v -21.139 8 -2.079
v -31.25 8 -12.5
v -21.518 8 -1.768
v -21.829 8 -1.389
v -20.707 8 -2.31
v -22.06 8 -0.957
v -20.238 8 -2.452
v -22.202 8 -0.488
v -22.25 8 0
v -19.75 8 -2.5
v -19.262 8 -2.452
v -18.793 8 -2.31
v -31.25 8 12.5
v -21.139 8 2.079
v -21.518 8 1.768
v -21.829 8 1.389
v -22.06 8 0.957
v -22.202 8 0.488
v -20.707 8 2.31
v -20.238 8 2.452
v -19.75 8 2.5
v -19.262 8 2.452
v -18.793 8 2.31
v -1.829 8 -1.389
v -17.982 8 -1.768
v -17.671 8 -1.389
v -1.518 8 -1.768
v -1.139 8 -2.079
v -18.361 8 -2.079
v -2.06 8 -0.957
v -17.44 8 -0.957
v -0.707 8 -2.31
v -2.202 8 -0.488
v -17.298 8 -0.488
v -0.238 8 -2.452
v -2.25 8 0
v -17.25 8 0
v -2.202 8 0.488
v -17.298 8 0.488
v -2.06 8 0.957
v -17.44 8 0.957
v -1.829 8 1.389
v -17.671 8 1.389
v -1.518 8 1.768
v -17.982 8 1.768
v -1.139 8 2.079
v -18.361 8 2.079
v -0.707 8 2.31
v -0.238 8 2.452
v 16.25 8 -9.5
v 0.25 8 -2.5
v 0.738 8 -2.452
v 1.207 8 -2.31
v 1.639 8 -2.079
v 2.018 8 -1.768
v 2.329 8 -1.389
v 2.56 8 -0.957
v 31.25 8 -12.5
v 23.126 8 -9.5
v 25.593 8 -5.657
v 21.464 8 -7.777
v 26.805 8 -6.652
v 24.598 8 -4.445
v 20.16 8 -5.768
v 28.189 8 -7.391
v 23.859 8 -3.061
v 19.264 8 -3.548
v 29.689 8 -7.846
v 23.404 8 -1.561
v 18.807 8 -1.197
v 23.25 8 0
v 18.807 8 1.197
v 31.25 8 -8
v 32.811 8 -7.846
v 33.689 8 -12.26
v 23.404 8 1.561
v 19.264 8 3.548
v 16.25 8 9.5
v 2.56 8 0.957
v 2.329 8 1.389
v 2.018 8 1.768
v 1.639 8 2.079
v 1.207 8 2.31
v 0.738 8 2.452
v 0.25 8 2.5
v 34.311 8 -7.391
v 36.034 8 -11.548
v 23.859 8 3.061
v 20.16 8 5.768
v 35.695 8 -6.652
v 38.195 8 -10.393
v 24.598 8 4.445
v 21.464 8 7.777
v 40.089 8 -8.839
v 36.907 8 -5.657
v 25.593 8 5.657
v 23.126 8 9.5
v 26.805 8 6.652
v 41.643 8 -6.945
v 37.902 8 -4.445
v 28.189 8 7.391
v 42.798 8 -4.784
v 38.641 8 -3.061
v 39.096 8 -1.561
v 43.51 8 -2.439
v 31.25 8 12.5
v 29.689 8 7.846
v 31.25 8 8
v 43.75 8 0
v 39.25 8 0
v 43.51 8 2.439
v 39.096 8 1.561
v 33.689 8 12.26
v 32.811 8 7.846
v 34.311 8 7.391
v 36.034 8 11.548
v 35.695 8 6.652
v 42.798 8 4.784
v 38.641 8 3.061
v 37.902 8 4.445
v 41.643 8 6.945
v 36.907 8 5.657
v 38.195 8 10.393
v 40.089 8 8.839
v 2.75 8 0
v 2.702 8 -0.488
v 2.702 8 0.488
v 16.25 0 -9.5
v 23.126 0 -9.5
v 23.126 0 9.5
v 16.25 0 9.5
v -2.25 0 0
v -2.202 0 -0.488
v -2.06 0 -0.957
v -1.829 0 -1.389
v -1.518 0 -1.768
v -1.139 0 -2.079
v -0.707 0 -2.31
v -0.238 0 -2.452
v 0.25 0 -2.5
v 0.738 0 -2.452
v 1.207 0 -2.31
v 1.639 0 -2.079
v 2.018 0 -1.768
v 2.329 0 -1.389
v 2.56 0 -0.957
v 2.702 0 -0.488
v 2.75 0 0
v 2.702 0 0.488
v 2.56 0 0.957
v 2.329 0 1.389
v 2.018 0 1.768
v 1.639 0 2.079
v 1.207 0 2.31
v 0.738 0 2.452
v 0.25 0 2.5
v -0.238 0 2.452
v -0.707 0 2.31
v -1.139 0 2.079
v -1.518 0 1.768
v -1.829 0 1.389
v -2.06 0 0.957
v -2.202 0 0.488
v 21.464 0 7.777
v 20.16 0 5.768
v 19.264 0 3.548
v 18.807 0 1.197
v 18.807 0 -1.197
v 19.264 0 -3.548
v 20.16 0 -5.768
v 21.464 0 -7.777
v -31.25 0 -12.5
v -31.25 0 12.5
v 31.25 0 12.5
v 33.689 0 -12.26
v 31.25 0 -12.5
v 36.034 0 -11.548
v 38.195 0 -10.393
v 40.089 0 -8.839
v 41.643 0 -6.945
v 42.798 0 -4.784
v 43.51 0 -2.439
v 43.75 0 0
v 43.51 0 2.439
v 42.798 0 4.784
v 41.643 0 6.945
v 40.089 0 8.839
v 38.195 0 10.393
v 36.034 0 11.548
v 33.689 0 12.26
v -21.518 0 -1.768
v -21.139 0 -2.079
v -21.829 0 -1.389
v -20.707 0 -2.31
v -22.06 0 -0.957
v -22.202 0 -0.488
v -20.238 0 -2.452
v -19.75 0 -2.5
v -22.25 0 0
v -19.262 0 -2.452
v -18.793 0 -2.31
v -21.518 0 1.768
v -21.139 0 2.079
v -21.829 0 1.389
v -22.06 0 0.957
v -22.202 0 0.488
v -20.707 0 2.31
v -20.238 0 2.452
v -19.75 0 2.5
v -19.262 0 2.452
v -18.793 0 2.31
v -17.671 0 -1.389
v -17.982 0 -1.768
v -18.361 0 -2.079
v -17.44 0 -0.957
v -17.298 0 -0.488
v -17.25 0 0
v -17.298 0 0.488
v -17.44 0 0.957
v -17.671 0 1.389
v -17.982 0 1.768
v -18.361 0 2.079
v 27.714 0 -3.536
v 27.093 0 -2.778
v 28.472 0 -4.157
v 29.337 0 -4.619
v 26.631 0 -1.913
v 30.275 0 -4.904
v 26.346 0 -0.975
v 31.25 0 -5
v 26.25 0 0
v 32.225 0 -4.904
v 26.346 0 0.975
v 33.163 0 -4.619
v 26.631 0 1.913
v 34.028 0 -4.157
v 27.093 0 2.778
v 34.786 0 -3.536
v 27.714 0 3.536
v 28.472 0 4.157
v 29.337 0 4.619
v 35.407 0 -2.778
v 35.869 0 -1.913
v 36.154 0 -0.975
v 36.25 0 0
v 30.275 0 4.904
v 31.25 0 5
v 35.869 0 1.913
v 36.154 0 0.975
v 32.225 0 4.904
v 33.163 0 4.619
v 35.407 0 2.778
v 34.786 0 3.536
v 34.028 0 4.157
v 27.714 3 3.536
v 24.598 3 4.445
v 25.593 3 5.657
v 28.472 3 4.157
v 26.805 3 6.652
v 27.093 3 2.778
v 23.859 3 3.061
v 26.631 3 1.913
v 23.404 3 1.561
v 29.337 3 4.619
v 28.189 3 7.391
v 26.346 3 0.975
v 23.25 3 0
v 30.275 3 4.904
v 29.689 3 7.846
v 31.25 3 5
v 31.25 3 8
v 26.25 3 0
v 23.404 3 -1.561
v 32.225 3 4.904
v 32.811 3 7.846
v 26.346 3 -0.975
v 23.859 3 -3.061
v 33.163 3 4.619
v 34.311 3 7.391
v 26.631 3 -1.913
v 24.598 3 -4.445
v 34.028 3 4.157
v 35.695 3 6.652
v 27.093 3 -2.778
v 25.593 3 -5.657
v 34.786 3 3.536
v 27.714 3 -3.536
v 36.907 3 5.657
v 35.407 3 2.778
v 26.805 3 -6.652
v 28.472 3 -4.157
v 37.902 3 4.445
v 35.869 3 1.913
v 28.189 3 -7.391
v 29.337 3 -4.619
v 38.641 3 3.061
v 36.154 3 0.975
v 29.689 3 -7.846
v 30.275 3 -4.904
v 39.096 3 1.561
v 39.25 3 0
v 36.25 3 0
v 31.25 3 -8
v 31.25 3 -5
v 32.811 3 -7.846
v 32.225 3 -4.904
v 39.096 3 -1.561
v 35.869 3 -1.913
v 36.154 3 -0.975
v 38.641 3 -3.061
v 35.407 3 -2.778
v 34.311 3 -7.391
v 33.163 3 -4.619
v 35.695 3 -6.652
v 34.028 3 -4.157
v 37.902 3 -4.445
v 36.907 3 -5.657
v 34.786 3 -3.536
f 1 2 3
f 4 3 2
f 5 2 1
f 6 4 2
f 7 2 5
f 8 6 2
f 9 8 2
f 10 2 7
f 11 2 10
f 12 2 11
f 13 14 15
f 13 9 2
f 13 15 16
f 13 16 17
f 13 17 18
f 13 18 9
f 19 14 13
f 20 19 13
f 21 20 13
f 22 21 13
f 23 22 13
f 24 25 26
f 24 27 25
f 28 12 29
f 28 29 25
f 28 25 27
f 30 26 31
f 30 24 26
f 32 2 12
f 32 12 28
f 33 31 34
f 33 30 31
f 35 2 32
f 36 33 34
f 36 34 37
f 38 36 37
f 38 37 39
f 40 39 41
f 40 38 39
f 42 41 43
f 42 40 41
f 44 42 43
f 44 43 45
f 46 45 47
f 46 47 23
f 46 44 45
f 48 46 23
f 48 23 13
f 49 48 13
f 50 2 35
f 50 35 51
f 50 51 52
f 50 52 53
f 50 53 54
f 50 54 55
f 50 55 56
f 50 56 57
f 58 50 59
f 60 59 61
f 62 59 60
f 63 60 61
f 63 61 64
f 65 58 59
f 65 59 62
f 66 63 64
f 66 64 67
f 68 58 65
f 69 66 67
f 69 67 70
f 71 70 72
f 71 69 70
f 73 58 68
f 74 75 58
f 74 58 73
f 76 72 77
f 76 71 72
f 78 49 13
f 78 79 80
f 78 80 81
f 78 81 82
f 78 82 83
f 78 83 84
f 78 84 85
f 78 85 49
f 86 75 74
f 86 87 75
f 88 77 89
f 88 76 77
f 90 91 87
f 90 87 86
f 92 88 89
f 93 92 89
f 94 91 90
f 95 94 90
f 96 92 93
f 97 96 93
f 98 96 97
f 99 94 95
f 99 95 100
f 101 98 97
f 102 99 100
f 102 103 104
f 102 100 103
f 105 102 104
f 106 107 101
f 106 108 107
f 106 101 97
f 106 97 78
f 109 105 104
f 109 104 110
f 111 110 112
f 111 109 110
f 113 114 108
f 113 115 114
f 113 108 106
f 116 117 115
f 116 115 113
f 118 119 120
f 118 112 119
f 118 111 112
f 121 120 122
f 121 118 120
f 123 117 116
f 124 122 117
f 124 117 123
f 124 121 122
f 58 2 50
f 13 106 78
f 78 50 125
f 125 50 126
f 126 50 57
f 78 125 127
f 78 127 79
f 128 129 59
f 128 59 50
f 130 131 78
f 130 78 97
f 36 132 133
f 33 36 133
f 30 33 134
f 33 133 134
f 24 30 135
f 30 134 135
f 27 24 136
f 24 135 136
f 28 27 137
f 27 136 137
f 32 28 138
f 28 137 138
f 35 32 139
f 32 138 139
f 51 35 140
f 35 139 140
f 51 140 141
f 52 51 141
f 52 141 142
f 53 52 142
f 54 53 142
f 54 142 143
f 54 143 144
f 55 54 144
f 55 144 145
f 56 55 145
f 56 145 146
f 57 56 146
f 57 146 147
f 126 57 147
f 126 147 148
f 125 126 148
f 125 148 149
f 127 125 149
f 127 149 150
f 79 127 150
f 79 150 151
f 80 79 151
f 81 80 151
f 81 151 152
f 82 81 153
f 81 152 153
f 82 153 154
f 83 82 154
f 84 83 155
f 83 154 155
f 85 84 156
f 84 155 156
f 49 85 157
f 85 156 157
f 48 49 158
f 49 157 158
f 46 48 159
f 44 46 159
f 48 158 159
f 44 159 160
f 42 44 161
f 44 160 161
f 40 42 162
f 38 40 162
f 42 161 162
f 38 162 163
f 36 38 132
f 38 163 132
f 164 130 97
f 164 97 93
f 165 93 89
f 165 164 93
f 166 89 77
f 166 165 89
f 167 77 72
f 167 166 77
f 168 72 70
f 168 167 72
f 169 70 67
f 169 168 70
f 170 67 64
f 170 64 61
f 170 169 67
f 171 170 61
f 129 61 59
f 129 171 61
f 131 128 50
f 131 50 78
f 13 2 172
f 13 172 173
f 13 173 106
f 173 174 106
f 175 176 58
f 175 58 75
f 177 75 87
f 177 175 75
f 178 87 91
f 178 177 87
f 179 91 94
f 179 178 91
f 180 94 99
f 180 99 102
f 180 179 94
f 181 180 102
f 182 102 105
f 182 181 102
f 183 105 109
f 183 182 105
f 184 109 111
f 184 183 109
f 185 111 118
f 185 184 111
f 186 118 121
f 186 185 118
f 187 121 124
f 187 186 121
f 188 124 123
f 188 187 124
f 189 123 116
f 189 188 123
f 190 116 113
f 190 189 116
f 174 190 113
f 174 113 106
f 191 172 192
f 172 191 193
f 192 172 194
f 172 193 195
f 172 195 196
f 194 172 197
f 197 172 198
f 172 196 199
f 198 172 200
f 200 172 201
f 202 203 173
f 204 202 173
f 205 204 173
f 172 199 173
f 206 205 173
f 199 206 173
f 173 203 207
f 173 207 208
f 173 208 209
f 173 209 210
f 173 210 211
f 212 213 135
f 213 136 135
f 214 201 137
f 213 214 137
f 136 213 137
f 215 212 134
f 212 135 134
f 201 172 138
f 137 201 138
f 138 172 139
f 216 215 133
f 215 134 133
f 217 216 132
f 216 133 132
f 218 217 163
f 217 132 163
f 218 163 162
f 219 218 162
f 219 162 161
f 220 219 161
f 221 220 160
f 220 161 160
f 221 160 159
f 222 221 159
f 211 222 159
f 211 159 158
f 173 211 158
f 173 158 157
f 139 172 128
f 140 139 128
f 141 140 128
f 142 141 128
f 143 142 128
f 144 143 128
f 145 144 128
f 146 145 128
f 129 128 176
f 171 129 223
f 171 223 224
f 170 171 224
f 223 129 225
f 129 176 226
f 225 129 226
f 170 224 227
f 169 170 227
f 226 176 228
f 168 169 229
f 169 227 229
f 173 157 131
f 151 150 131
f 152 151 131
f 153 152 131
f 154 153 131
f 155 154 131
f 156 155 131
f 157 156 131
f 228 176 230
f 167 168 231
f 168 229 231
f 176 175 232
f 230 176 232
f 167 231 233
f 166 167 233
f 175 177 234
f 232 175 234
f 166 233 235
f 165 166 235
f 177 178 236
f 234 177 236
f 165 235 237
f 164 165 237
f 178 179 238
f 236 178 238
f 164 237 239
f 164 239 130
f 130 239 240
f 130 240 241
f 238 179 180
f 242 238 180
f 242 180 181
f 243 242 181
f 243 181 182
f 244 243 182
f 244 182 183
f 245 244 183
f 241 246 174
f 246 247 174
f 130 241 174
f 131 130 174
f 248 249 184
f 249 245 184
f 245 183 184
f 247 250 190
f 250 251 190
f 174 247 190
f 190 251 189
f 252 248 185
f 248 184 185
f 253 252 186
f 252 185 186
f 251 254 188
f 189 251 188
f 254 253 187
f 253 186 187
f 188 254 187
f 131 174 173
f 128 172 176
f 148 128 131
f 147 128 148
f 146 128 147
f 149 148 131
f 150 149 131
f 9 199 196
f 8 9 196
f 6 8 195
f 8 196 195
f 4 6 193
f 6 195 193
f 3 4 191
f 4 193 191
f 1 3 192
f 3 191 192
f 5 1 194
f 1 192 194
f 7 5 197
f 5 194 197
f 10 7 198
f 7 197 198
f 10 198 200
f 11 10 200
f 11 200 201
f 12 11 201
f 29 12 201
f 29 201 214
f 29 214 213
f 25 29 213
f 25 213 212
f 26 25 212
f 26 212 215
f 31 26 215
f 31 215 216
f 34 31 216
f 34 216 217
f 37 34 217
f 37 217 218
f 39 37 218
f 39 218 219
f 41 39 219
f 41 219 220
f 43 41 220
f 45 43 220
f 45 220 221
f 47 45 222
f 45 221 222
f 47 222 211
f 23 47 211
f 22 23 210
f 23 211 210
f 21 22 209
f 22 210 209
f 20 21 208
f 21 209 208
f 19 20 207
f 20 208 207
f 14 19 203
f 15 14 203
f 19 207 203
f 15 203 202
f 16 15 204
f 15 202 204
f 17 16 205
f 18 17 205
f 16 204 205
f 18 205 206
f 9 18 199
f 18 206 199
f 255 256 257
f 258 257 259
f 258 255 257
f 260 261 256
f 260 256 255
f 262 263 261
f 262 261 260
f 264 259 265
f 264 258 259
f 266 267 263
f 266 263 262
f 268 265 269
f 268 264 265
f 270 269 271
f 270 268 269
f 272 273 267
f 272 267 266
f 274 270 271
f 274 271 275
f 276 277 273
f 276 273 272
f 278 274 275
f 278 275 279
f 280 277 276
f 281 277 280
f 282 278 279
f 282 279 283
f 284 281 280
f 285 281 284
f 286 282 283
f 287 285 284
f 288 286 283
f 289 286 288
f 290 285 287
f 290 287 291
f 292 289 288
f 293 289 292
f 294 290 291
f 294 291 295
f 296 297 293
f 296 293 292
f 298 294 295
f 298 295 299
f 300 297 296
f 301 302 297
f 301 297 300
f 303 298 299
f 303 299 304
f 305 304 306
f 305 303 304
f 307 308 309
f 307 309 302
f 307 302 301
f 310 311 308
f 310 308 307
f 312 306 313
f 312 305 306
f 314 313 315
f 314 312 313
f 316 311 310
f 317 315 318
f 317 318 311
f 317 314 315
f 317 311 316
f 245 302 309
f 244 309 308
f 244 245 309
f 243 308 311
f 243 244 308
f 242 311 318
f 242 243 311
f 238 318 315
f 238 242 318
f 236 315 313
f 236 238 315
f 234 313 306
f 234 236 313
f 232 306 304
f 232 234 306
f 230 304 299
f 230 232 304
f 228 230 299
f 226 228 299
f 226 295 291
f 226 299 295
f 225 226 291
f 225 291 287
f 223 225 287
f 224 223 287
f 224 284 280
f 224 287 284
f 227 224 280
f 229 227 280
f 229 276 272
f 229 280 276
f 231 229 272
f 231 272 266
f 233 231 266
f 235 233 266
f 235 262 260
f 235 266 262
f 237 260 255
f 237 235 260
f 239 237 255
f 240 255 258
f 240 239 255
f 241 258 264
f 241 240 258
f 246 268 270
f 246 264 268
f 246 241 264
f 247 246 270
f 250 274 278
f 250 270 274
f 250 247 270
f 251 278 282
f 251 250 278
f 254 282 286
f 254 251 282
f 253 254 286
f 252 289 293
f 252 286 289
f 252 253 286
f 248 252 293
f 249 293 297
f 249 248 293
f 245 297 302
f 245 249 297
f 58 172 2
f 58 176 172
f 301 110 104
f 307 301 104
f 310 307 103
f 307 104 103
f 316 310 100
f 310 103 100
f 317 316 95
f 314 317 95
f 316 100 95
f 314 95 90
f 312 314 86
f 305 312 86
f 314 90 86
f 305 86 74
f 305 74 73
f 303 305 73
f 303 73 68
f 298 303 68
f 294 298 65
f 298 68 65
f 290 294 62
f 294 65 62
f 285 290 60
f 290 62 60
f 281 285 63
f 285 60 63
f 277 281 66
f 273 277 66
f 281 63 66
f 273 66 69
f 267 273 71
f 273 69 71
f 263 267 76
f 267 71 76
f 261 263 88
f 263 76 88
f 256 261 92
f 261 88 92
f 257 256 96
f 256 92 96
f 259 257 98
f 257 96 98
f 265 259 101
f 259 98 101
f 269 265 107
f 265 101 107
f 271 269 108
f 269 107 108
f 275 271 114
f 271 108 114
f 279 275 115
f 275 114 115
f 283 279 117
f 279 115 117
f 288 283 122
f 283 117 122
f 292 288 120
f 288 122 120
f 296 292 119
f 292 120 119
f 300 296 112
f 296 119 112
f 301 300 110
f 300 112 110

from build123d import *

# Parameters (mm, degrees)
SKETCH1_R           = 5
BOSS_EXTRUDE1_DEPTH = 8
SKETCH2_R           = 8
CUT_EXTRUDE1_DEPTH  = 5
SKETCH3_W           = 25
SKETCH3_H           = 8
BOSS_EXTRUDE2_DEPTH = 15
SKETCH4_R           = 2.5
CUT_EXTRUDE2_DEPTH  = 10


with BuildPart() as part:
    # Sketch1 → Boss-Extrude1 (new body)
    with BuildSketch(Plane(origin=(0, 0, 0), x_dir=(1, 0, 0), z_dir=(0, 1, 0))):
        with BuildLine():
            Line((-16.25, 12.5), (16.25, 12.5))
            Line((16.25, 12.5), (31.25, 12.5))
            ThreePointArc((31.25, 12.5), (43.75, 0), (31.25, -12.5))
            Line((31.25, -12.5), (16.25, -12.5))
            Line((16.25, -12.5), (-16.25, -12.5))
            Line((-16.25, -12.5), (-16.25, 12.5))
        make_face()
        with Locations((31.25, 0)):
            Circle(SKETCH1_R, mode=Mode.SUBTRACT)
        with BuildLine():
            Line((16.25, 9.5), (16.25, -9.5))
            Line((16.25, -9.5), (23.125961595, -9.5))
            ThreePointArc((23.125961595, -9.5), (18.75, 0), (23.125961595, 9.5))
            Line((23.125961595, 9.5), (16.25, 9.5))
        make_face(mode=Mode.SUBTRACT)
    extrude(amount=BOSS_EXTRUDE1_DEPTH)

    # Sketch2 → Cut-Extrude1 (cut)
    with BuildSketch(Plane(origin=(0, 8, 0), x_dir=(1, 0, 0), z_dir=(0, 1, 0))):
        with Locations((31.25, 0)):
            Circle(SKETCH2_R)
    extrude(amount=-CUT_EXTRUDE1_DEPTH, mode=Mode.SUBTRACT)

    # Sketch3 → Boss-Extrude2 (add)
    with BuildSketch(Plane.ZY.offset(16.25)):
        with Locations((0, 4)):
            Rectangle(SKETCH3_W, SKETCH3_H)
    extrude(amount=BOSS_EXTRUDE2_DEPTH)

    # Sketch4 → Cut-Extrude2 (cut)
    with BuildSketch(Plane(origin=(0, 0, 0), x_dir=(-1, 0, 0), z_dir=(0, -1, 0))):
        with Locations((-0.25, 0)):
            Circle(SKETCH4_R)
        with Locations((19.75, 0)):
            Circle(SKETCH4_R)
    extrude(amount=-CUT_EXTRUDE2_DEPTH, mode=Mode.SUBTRACT)


solid = part.part
